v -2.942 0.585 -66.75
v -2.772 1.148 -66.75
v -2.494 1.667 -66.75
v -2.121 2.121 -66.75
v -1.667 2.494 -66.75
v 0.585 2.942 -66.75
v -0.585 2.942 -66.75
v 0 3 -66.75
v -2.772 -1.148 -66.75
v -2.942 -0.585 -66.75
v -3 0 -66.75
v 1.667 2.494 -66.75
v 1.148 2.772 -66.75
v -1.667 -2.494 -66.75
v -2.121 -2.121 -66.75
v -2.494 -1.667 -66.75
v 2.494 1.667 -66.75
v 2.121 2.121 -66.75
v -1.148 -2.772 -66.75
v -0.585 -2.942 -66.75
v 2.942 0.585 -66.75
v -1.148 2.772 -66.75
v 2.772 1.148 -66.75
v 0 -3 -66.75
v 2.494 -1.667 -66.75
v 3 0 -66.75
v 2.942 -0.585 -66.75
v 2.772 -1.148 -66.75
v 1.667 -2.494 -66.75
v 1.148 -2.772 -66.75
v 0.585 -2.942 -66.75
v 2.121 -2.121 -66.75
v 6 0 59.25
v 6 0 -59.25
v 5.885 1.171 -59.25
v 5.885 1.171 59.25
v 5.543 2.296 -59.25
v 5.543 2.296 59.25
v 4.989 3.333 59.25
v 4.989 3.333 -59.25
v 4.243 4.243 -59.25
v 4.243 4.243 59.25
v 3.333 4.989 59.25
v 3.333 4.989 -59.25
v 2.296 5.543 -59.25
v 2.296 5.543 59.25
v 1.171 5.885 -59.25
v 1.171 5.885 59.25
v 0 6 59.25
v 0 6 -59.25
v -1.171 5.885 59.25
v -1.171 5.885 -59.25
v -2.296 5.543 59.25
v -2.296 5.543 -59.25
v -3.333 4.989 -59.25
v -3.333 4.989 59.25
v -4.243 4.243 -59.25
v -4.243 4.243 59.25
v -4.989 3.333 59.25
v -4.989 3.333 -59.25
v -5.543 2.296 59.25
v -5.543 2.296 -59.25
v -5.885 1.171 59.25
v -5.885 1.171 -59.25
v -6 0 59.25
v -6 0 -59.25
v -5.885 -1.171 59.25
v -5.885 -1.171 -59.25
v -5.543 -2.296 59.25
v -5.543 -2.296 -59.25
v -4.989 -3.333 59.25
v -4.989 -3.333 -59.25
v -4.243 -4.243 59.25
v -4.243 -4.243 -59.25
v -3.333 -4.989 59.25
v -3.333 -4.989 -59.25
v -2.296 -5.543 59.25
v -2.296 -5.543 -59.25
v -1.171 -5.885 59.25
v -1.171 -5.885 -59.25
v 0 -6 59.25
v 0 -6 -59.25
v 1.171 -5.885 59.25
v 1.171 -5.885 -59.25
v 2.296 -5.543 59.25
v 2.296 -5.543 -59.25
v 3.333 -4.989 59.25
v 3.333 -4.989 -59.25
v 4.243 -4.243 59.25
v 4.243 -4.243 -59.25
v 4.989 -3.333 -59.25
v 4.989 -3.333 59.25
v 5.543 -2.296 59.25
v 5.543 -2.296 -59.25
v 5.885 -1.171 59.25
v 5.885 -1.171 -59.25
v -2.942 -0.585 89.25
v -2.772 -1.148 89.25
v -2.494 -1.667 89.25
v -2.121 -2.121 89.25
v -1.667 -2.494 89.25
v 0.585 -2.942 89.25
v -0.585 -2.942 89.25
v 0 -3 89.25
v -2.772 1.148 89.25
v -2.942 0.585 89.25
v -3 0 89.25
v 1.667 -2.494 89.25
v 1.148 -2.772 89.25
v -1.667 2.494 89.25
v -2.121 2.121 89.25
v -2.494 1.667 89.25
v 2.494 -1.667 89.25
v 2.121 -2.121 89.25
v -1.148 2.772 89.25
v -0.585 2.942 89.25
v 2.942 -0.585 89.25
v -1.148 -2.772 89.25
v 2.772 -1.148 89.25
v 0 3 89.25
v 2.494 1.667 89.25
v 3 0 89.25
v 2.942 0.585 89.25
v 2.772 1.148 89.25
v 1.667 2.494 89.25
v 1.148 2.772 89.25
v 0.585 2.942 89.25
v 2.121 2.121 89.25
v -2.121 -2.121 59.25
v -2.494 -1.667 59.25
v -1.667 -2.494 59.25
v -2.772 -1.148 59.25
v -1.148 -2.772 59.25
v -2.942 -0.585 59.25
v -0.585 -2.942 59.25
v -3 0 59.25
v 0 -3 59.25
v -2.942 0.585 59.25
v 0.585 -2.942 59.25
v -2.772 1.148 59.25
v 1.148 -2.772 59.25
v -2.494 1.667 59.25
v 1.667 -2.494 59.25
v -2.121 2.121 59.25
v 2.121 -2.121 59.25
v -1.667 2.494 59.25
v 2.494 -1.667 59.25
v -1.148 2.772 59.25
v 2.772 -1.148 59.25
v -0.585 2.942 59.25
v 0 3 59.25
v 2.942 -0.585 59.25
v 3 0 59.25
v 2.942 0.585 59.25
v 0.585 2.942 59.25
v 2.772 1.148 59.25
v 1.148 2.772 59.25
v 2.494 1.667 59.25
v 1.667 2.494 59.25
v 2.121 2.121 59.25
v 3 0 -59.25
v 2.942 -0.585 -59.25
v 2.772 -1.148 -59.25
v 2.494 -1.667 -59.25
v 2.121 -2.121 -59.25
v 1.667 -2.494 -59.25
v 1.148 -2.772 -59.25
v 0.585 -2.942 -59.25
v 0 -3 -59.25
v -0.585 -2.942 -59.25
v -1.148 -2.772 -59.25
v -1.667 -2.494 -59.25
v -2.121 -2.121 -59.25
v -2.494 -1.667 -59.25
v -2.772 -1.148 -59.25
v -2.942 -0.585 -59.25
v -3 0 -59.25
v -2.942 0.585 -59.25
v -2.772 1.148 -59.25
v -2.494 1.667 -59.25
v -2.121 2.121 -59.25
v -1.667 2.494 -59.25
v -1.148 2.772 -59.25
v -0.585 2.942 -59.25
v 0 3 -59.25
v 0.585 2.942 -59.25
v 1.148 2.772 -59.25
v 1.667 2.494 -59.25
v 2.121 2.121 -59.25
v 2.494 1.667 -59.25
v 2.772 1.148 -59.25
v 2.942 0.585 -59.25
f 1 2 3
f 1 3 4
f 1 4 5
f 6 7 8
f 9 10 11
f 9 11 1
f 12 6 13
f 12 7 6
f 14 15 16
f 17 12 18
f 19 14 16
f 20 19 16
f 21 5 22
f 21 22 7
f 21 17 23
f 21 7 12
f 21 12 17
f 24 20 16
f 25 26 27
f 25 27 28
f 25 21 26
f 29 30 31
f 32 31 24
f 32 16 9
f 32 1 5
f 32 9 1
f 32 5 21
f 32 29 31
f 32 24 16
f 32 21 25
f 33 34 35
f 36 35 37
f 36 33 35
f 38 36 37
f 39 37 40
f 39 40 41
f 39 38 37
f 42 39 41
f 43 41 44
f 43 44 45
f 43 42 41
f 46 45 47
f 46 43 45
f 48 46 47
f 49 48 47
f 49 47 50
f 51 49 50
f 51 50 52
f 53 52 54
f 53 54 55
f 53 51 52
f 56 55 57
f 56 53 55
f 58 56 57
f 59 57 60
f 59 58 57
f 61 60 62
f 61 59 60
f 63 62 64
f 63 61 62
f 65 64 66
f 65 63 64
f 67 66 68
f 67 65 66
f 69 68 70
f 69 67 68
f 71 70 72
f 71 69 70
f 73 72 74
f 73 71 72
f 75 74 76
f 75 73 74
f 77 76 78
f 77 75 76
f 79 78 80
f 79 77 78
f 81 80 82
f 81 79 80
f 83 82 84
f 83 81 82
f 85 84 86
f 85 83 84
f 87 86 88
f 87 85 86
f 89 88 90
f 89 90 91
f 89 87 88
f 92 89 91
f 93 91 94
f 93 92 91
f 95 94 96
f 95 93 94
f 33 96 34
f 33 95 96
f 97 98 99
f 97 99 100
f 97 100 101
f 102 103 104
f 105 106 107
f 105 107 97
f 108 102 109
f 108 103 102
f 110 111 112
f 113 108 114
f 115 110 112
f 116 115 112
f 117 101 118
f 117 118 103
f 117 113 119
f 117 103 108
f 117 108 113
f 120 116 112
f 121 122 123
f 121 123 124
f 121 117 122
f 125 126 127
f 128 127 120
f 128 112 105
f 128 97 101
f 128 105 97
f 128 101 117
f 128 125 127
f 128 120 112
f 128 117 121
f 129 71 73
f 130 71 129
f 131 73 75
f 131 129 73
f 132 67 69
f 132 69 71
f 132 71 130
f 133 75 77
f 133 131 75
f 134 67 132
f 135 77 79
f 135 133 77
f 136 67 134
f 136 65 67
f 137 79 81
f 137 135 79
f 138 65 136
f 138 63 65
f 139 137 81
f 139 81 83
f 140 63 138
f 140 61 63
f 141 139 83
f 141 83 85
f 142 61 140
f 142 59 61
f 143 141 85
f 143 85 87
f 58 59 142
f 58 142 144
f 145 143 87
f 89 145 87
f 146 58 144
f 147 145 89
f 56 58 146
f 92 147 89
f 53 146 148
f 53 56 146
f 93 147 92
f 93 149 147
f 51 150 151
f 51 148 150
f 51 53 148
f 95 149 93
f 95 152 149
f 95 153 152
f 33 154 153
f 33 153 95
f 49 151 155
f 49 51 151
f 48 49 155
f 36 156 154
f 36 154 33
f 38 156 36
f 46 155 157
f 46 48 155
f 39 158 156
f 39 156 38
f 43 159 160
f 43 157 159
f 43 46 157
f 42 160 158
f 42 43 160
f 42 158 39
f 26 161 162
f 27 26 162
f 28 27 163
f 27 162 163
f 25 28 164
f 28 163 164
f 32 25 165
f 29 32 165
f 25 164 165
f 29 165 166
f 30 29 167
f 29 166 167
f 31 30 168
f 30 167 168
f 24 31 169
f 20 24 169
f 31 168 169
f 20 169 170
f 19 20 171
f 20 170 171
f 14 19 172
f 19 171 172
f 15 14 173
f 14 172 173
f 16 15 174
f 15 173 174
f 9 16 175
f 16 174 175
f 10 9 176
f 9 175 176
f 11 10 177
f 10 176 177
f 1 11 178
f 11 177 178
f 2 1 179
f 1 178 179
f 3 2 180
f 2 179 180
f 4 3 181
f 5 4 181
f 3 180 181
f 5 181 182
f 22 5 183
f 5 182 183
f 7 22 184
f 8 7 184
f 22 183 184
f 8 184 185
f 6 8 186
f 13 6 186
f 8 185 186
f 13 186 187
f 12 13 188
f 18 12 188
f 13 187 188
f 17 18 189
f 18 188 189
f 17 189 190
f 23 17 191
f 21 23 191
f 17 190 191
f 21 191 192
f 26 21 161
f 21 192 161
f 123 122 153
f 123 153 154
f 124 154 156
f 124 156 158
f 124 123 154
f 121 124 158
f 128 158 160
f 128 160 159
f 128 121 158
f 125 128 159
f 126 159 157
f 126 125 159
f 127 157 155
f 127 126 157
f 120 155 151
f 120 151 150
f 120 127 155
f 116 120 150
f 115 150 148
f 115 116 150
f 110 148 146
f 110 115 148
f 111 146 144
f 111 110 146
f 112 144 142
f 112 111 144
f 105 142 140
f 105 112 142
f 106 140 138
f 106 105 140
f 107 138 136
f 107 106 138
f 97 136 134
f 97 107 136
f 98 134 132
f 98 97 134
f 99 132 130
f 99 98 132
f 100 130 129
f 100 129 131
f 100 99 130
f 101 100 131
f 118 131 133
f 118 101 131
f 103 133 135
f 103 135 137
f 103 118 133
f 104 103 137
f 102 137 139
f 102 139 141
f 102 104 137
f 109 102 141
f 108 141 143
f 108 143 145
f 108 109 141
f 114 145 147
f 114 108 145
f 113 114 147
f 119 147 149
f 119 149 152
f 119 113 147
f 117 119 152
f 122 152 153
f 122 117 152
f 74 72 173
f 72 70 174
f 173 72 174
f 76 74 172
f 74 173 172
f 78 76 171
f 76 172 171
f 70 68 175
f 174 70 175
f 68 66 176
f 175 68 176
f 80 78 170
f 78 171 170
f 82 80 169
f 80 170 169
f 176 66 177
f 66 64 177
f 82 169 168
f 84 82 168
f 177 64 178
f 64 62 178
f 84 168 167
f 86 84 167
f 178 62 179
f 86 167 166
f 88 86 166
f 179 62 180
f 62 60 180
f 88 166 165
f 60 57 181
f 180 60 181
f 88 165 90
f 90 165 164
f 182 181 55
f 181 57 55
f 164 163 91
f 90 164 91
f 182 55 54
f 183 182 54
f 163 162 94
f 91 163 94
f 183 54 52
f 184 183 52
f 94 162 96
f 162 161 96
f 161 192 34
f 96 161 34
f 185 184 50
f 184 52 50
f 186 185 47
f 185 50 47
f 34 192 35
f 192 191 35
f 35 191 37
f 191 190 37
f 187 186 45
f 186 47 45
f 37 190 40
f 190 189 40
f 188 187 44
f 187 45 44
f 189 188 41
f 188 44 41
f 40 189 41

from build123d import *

# Parameters (mm, degrees)
SKETCH1_R           = 6
BOSS_EXTRUDE1_DEPTH = 59.25
SKETCH3_R           = 3
BOSS_EXTRUDE3_DEPTH = 7.5
BOSS_EXTRUDE4_START = 30
SKETCH2_R           = 3
BOSS_EXTRUDE4_DEPTH = 30


with BuildPart() as part:
    # Sketch1 → Boss-Extrude1 (new, symmetric)
    with BuildSketch(Plane.XY):
        Circle(SKETCH1_R)
    extrude(amount=BOSS_EXTRUDE1_DEPTH, both=True)

    # Sketch3 → Boss-Extrude3 (add)
    with BuildSketch(Plane(origin=(0, 0, -59.25), x_dir=(-1, 0, 0), z_dir=(0, 0, -1))):
        with Locations(Location((0, 0, 0), (0, 0, 180))):
            Circle(SKETCH3_R)
    extrude(amount=BOSS_EXTRUDE3_DEPTH)

    # Sketch2 → Boss-Extrude4 (add)
    with BuildSketch(Plane.XY.offset(59.25).offset(BOSS_EXTRUDE4_START)):
        Circle(SKETCH2_R)
    extrude(amount=-BOSS_EXTRUDE4_DEPTH)


solid = part.part
